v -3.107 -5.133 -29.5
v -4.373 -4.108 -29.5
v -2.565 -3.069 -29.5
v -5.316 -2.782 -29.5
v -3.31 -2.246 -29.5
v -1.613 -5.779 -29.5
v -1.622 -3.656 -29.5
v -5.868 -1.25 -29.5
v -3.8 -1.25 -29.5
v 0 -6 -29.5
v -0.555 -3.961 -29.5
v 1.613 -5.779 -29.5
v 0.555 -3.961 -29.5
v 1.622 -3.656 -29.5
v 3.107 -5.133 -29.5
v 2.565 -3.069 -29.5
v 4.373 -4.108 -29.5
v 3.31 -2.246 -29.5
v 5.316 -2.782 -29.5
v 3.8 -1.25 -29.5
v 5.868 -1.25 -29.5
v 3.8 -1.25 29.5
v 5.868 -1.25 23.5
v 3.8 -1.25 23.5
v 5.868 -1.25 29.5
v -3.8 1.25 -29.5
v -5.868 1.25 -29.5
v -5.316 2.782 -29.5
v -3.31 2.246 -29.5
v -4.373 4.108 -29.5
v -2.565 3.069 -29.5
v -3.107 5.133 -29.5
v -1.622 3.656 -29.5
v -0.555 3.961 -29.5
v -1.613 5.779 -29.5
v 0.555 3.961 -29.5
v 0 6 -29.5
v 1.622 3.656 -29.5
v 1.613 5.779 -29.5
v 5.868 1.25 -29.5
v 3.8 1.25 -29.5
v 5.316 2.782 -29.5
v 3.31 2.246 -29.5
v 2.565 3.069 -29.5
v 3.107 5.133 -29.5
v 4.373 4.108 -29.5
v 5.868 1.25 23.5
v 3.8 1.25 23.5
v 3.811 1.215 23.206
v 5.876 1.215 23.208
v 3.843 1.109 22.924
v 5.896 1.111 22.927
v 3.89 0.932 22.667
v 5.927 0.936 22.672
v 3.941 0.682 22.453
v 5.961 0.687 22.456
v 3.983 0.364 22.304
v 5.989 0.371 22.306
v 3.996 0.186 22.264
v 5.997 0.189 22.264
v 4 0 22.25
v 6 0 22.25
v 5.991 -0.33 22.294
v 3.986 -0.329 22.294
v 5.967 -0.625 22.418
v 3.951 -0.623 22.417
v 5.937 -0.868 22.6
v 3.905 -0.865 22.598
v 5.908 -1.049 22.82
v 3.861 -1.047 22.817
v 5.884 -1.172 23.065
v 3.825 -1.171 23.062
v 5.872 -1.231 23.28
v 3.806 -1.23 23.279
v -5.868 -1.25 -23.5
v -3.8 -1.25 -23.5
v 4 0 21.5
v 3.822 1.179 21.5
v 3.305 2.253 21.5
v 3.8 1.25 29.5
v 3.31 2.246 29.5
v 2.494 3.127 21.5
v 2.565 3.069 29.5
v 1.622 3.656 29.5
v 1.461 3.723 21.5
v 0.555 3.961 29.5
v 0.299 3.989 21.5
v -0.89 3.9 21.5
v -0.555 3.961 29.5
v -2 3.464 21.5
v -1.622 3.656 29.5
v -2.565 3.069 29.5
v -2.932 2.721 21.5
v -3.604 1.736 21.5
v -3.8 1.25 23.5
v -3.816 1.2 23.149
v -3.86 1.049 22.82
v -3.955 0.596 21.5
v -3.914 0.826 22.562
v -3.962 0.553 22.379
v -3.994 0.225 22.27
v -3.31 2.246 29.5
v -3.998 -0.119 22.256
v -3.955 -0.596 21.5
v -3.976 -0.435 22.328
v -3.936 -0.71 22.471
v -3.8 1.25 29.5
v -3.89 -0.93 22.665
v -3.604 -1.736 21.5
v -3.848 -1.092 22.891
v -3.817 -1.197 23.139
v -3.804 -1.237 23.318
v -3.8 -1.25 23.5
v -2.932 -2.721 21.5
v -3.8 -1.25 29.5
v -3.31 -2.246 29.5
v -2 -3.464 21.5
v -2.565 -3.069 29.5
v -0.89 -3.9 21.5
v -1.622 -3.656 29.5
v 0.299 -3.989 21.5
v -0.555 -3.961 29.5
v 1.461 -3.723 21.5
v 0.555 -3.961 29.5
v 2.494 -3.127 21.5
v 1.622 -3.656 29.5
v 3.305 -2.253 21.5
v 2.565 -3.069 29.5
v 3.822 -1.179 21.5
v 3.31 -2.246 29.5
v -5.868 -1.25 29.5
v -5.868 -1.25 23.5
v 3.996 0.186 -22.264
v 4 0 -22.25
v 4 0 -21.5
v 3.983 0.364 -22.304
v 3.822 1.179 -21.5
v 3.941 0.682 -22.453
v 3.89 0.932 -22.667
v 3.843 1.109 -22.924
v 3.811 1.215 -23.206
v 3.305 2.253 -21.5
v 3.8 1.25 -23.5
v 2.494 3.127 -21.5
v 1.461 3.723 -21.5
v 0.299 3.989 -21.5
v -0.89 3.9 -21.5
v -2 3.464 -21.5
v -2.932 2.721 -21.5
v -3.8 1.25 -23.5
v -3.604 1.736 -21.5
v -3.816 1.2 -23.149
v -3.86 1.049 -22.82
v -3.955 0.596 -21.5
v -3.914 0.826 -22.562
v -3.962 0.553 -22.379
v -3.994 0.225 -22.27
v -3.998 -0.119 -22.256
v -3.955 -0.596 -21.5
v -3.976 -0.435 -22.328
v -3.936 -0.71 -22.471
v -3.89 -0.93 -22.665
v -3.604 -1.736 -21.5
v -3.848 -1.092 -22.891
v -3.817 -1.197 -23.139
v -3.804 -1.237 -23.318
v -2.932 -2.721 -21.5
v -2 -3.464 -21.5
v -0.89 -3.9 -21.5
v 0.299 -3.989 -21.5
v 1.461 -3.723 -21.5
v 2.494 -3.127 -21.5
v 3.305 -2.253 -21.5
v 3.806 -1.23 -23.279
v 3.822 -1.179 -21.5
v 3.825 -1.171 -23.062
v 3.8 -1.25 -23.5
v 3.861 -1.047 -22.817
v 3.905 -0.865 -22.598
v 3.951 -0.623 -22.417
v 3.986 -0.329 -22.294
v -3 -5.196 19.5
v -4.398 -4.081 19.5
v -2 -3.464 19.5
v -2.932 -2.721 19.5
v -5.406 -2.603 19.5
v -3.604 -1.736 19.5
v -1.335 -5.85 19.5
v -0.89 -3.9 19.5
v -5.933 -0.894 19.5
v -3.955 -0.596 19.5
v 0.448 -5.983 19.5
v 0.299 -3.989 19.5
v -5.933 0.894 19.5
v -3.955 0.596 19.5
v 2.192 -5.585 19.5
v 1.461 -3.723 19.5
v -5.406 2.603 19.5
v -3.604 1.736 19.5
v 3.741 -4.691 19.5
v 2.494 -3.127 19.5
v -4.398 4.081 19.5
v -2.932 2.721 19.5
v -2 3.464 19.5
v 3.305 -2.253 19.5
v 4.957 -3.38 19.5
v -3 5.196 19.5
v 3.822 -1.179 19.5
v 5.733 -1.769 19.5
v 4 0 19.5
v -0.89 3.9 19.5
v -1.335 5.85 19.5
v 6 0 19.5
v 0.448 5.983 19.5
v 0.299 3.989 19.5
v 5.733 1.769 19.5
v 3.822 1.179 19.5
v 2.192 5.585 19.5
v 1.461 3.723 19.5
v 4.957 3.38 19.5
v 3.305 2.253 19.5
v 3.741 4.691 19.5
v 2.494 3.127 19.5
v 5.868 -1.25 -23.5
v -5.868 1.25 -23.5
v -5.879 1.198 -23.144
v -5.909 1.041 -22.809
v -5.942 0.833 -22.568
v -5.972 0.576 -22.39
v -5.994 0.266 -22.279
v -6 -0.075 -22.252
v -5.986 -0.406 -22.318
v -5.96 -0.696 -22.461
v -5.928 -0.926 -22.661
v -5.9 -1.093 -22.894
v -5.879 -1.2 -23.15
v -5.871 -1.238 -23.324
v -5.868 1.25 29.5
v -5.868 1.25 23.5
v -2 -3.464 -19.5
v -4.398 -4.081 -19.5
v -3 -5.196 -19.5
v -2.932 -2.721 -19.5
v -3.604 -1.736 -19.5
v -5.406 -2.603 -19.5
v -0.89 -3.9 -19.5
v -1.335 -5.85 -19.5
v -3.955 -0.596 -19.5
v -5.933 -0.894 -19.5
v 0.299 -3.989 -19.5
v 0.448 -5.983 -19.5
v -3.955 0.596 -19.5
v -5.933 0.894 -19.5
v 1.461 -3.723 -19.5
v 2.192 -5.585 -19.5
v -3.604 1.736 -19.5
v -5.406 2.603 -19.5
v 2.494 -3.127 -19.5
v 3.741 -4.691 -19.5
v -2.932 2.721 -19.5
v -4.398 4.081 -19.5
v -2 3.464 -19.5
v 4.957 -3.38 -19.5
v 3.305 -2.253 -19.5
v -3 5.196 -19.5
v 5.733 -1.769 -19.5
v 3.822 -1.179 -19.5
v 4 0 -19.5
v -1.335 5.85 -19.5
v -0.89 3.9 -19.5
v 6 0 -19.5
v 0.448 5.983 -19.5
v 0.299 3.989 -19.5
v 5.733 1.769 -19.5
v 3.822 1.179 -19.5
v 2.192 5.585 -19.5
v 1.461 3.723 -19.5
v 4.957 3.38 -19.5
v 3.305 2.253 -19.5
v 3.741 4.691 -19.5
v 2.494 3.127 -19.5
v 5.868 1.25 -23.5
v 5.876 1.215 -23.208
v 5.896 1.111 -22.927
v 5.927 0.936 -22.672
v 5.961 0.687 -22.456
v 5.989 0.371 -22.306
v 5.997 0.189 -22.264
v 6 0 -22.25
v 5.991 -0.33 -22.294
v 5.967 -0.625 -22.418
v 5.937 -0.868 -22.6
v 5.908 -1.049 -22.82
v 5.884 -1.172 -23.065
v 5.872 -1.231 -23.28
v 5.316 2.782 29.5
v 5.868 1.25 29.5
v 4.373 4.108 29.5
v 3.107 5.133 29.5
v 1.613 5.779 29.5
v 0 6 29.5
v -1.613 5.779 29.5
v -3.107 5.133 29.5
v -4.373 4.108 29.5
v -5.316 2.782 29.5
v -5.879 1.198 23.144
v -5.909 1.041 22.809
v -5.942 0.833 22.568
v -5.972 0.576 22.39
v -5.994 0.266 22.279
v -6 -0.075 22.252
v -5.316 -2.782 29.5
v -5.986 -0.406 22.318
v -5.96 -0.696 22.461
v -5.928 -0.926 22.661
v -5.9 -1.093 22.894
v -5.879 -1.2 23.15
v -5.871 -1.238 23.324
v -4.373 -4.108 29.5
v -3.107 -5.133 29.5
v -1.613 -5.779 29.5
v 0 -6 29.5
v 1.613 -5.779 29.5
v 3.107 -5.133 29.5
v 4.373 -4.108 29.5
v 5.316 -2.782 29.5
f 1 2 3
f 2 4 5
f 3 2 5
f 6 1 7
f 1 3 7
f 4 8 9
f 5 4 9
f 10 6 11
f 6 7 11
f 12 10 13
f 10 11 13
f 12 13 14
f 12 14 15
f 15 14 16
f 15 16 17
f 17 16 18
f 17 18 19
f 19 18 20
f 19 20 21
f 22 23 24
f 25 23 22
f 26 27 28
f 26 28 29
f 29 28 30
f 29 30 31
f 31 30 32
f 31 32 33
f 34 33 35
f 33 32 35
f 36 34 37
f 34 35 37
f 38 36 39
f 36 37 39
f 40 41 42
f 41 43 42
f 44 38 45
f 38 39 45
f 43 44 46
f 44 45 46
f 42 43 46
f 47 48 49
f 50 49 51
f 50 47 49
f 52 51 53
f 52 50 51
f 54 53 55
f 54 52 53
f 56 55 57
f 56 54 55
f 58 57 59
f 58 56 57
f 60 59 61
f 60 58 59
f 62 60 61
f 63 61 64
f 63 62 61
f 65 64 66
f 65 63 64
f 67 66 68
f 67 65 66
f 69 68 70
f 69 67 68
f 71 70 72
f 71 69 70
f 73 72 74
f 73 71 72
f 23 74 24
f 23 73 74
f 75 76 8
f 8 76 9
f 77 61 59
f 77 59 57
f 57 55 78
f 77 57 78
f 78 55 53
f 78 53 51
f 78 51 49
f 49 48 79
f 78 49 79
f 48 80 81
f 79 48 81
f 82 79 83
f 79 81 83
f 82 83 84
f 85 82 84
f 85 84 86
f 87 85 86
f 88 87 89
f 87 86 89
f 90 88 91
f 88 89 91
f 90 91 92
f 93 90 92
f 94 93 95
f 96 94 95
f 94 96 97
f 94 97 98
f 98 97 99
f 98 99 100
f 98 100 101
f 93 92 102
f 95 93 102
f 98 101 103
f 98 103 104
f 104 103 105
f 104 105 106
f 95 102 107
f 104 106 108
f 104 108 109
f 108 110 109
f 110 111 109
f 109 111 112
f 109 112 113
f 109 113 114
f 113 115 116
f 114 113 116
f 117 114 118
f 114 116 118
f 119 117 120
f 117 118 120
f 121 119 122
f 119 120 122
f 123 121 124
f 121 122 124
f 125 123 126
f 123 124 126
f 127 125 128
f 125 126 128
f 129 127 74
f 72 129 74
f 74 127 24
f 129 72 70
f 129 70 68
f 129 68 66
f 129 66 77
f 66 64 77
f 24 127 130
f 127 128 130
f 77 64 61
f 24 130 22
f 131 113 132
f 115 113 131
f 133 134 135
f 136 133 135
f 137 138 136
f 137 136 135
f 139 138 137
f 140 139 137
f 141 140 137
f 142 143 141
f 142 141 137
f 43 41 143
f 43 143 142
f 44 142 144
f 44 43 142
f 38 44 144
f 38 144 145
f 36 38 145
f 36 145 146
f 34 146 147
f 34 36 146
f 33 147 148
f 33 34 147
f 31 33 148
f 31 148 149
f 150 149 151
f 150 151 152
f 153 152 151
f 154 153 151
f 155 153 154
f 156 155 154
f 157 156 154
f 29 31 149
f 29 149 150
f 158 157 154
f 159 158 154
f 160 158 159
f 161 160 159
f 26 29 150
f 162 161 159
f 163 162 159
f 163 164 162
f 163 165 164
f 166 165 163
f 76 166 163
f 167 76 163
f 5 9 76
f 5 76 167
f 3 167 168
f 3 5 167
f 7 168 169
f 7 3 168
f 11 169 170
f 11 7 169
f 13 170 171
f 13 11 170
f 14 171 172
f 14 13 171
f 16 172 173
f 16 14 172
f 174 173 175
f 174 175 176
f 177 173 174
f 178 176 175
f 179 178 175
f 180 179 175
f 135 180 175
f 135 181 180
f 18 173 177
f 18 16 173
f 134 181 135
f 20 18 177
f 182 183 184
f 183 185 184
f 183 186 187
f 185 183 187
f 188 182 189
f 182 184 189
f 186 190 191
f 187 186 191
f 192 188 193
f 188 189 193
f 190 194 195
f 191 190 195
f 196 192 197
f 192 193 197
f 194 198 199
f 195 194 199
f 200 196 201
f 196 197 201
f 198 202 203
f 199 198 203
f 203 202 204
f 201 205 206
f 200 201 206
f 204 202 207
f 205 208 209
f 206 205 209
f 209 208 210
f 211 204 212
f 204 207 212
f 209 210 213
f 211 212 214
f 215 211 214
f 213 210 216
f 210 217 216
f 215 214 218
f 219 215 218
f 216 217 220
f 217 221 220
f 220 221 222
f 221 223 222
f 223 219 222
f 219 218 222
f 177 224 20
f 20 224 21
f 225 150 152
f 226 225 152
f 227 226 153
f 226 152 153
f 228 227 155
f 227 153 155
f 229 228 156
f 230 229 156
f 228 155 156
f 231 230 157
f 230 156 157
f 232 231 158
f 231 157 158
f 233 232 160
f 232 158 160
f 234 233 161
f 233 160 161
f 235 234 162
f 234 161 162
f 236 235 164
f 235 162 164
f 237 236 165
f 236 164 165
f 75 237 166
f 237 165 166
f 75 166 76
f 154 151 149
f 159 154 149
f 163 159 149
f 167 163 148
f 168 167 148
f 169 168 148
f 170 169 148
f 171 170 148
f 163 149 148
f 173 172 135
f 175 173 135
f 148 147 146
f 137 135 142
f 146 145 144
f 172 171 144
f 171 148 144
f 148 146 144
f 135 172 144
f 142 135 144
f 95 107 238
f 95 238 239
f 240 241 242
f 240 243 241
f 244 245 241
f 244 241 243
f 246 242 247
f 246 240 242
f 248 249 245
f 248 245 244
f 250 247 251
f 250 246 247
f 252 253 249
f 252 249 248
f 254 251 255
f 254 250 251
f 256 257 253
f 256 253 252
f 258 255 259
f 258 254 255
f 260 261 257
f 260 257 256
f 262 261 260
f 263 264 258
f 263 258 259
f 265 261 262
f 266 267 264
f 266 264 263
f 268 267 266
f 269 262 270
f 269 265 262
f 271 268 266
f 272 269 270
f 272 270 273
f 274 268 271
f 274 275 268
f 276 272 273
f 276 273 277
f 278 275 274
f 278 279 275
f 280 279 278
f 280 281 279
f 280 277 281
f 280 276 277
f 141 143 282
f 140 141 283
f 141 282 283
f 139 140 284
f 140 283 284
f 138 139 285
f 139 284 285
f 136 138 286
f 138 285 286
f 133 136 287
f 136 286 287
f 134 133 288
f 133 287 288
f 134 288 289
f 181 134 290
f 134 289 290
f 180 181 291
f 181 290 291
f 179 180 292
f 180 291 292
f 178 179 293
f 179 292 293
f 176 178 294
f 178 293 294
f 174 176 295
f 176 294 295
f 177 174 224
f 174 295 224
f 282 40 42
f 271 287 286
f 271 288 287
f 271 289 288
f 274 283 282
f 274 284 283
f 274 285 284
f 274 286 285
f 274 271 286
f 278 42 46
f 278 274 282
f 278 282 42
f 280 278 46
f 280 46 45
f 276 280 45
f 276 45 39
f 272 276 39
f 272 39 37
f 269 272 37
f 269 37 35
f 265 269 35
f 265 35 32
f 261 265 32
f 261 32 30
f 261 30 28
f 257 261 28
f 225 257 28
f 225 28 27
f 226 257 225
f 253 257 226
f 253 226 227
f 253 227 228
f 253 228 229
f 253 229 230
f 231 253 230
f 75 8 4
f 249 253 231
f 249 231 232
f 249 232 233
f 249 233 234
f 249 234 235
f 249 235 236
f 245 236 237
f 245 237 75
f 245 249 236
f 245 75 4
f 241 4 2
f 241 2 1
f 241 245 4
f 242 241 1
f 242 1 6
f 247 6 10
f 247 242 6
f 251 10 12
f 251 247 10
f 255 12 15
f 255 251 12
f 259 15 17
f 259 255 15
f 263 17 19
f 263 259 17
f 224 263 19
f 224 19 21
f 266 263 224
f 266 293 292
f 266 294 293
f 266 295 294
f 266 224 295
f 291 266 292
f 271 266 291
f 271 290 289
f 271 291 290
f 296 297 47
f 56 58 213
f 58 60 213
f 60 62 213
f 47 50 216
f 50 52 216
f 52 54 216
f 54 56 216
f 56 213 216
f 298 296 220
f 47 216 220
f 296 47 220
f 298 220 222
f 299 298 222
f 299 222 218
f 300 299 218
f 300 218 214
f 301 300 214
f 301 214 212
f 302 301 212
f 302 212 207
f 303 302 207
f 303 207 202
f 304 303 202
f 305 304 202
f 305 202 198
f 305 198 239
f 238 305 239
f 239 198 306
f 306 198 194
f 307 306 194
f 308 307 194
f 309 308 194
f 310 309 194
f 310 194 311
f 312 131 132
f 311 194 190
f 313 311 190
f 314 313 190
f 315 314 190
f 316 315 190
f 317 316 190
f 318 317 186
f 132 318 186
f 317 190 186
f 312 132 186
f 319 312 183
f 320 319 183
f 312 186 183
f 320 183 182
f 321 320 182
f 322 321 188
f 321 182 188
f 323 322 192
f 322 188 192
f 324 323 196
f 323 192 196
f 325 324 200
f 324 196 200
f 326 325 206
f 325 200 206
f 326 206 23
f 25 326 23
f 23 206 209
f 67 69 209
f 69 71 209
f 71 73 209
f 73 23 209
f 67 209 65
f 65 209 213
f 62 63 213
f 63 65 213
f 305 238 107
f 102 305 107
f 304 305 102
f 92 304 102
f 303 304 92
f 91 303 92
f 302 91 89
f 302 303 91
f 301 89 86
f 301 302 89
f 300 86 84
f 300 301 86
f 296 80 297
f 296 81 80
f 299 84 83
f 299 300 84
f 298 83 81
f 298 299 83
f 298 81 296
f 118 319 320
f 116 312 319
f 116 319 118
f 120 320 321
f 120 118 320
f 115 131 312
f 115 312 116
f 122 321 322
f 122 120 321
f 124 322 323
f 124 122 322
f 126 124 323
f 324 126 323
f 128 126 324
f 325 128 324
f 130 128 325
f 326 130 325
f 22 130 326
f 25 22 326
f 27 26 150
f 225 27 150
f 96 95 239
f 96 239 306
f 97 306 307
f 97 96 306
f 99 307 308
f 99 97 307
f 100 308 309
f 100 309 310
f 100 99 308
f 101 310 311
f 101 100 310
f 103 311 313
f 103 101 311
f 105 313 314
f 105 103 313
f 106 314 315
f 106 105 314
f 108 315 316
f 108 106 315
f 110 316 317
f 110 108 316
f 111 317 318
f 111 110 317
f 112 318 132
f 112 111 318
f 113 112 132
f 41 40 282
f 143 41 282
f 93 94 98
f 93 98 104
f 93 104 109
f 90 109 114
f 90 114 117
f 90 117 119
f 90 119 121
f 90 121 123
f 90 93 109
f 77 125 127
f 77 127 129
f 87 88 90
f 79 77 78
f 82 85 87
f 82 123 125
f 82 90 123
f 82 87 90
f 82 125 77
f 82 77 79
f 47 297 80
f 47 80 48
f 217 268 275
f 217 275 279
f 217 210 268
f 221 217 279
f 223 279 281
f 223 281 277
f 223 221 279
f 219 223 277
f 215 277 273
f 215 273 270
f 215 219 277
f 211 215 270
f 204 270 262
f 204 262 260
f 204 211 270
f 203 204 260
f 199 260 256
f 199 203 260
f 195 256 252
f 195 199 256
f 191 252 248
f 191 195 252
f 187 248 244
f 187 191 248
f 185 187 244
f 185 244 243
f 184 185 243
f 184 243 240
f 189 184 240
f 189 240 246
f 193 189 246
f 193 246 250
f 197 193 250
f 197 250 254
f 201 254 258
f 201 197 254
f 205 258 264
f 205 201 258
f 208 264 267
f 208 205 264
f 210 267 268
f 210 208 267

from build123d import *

# Parameters (mm, degrees)
CROQUIS1_R              = 4
SALIENTE_EXTRUIR1_DEPTH = 19.5
CROQUIS2_R              = 6
SALIENTE_EXTRUIR2_DEPTH = 10
CROQUIS3_R              = 4
CORTAR_EXTRUIR1_DEPTH   = 8
CORTAR_EXTRUIR2_DEPTH   = 33.407560846


with BuildPart() as part:
    # Croquis1 → Saliente-Extruir1 (new, symmetric)
    with BuildSketch(Plane.XY):
        Circle(CROQUIS1_R)
    extrude(amount=SALIENTE_EXTRUIR1_DEPTH, both=True)

    # Croquis2 → Saliente-Extruir2 (add)
    with BuildSketch(Plane.XY.offset(19.5)):
        Circle(CROQUIS2_R)
    saliente_extruir2 = extrude(amount=SALIENTE_EXTRUIR2_DEPTH)

    # Croquis3 → Cortar-Extruir1 (cut)
    with BuildSketch(Plane.XY.offset(29.5)):
        Circle(CROQUIS3_R)
    cortar_extruir1 = extrude(amount=-CORTAR_EXTRUIR1_DEPTH, mode=Mode.SUBTRACT)

    # Croquis4 → Cortar-Extruir2 (cut, through all)
    with BuildSketch(Plane(origin=(6, 0, 0), x_dir=(0, 0, -1), z_dir=(1, 0, 0))):
        with BuildLine():
            Line((-29.5, 1.25), (-23.5, 1.25))
            ThreePointArc((-23.5, 1.25), (-22.25, 0), (-23.5, -1.25))
            Line((-23.5, -1.25), (-29.5, -1.25))
            ThreePointArc((-29.5, -1.25), (-30.75, 0), (-29.5, 1.25))
        make_face()
    cortar_extruir2 = extrude(amount=-CORTAR_EXTRUIR2_DEPTH, mode=Mode.SUBTRACT)

    # Simetría2: Saliente-Extruir2, Cortar-Extruir1, Cortar-Extruir2 across plane
    add(saliente_extruir2.mirror(Plane.XY))
    add(cortar_extruir1.mirror(Plane.XY), mode=Mode.SUBTRACT)
    add(cortar_extruir2.mirror(Plane.XY), mode=Mode.SUBTRACT)


solid = part.part
